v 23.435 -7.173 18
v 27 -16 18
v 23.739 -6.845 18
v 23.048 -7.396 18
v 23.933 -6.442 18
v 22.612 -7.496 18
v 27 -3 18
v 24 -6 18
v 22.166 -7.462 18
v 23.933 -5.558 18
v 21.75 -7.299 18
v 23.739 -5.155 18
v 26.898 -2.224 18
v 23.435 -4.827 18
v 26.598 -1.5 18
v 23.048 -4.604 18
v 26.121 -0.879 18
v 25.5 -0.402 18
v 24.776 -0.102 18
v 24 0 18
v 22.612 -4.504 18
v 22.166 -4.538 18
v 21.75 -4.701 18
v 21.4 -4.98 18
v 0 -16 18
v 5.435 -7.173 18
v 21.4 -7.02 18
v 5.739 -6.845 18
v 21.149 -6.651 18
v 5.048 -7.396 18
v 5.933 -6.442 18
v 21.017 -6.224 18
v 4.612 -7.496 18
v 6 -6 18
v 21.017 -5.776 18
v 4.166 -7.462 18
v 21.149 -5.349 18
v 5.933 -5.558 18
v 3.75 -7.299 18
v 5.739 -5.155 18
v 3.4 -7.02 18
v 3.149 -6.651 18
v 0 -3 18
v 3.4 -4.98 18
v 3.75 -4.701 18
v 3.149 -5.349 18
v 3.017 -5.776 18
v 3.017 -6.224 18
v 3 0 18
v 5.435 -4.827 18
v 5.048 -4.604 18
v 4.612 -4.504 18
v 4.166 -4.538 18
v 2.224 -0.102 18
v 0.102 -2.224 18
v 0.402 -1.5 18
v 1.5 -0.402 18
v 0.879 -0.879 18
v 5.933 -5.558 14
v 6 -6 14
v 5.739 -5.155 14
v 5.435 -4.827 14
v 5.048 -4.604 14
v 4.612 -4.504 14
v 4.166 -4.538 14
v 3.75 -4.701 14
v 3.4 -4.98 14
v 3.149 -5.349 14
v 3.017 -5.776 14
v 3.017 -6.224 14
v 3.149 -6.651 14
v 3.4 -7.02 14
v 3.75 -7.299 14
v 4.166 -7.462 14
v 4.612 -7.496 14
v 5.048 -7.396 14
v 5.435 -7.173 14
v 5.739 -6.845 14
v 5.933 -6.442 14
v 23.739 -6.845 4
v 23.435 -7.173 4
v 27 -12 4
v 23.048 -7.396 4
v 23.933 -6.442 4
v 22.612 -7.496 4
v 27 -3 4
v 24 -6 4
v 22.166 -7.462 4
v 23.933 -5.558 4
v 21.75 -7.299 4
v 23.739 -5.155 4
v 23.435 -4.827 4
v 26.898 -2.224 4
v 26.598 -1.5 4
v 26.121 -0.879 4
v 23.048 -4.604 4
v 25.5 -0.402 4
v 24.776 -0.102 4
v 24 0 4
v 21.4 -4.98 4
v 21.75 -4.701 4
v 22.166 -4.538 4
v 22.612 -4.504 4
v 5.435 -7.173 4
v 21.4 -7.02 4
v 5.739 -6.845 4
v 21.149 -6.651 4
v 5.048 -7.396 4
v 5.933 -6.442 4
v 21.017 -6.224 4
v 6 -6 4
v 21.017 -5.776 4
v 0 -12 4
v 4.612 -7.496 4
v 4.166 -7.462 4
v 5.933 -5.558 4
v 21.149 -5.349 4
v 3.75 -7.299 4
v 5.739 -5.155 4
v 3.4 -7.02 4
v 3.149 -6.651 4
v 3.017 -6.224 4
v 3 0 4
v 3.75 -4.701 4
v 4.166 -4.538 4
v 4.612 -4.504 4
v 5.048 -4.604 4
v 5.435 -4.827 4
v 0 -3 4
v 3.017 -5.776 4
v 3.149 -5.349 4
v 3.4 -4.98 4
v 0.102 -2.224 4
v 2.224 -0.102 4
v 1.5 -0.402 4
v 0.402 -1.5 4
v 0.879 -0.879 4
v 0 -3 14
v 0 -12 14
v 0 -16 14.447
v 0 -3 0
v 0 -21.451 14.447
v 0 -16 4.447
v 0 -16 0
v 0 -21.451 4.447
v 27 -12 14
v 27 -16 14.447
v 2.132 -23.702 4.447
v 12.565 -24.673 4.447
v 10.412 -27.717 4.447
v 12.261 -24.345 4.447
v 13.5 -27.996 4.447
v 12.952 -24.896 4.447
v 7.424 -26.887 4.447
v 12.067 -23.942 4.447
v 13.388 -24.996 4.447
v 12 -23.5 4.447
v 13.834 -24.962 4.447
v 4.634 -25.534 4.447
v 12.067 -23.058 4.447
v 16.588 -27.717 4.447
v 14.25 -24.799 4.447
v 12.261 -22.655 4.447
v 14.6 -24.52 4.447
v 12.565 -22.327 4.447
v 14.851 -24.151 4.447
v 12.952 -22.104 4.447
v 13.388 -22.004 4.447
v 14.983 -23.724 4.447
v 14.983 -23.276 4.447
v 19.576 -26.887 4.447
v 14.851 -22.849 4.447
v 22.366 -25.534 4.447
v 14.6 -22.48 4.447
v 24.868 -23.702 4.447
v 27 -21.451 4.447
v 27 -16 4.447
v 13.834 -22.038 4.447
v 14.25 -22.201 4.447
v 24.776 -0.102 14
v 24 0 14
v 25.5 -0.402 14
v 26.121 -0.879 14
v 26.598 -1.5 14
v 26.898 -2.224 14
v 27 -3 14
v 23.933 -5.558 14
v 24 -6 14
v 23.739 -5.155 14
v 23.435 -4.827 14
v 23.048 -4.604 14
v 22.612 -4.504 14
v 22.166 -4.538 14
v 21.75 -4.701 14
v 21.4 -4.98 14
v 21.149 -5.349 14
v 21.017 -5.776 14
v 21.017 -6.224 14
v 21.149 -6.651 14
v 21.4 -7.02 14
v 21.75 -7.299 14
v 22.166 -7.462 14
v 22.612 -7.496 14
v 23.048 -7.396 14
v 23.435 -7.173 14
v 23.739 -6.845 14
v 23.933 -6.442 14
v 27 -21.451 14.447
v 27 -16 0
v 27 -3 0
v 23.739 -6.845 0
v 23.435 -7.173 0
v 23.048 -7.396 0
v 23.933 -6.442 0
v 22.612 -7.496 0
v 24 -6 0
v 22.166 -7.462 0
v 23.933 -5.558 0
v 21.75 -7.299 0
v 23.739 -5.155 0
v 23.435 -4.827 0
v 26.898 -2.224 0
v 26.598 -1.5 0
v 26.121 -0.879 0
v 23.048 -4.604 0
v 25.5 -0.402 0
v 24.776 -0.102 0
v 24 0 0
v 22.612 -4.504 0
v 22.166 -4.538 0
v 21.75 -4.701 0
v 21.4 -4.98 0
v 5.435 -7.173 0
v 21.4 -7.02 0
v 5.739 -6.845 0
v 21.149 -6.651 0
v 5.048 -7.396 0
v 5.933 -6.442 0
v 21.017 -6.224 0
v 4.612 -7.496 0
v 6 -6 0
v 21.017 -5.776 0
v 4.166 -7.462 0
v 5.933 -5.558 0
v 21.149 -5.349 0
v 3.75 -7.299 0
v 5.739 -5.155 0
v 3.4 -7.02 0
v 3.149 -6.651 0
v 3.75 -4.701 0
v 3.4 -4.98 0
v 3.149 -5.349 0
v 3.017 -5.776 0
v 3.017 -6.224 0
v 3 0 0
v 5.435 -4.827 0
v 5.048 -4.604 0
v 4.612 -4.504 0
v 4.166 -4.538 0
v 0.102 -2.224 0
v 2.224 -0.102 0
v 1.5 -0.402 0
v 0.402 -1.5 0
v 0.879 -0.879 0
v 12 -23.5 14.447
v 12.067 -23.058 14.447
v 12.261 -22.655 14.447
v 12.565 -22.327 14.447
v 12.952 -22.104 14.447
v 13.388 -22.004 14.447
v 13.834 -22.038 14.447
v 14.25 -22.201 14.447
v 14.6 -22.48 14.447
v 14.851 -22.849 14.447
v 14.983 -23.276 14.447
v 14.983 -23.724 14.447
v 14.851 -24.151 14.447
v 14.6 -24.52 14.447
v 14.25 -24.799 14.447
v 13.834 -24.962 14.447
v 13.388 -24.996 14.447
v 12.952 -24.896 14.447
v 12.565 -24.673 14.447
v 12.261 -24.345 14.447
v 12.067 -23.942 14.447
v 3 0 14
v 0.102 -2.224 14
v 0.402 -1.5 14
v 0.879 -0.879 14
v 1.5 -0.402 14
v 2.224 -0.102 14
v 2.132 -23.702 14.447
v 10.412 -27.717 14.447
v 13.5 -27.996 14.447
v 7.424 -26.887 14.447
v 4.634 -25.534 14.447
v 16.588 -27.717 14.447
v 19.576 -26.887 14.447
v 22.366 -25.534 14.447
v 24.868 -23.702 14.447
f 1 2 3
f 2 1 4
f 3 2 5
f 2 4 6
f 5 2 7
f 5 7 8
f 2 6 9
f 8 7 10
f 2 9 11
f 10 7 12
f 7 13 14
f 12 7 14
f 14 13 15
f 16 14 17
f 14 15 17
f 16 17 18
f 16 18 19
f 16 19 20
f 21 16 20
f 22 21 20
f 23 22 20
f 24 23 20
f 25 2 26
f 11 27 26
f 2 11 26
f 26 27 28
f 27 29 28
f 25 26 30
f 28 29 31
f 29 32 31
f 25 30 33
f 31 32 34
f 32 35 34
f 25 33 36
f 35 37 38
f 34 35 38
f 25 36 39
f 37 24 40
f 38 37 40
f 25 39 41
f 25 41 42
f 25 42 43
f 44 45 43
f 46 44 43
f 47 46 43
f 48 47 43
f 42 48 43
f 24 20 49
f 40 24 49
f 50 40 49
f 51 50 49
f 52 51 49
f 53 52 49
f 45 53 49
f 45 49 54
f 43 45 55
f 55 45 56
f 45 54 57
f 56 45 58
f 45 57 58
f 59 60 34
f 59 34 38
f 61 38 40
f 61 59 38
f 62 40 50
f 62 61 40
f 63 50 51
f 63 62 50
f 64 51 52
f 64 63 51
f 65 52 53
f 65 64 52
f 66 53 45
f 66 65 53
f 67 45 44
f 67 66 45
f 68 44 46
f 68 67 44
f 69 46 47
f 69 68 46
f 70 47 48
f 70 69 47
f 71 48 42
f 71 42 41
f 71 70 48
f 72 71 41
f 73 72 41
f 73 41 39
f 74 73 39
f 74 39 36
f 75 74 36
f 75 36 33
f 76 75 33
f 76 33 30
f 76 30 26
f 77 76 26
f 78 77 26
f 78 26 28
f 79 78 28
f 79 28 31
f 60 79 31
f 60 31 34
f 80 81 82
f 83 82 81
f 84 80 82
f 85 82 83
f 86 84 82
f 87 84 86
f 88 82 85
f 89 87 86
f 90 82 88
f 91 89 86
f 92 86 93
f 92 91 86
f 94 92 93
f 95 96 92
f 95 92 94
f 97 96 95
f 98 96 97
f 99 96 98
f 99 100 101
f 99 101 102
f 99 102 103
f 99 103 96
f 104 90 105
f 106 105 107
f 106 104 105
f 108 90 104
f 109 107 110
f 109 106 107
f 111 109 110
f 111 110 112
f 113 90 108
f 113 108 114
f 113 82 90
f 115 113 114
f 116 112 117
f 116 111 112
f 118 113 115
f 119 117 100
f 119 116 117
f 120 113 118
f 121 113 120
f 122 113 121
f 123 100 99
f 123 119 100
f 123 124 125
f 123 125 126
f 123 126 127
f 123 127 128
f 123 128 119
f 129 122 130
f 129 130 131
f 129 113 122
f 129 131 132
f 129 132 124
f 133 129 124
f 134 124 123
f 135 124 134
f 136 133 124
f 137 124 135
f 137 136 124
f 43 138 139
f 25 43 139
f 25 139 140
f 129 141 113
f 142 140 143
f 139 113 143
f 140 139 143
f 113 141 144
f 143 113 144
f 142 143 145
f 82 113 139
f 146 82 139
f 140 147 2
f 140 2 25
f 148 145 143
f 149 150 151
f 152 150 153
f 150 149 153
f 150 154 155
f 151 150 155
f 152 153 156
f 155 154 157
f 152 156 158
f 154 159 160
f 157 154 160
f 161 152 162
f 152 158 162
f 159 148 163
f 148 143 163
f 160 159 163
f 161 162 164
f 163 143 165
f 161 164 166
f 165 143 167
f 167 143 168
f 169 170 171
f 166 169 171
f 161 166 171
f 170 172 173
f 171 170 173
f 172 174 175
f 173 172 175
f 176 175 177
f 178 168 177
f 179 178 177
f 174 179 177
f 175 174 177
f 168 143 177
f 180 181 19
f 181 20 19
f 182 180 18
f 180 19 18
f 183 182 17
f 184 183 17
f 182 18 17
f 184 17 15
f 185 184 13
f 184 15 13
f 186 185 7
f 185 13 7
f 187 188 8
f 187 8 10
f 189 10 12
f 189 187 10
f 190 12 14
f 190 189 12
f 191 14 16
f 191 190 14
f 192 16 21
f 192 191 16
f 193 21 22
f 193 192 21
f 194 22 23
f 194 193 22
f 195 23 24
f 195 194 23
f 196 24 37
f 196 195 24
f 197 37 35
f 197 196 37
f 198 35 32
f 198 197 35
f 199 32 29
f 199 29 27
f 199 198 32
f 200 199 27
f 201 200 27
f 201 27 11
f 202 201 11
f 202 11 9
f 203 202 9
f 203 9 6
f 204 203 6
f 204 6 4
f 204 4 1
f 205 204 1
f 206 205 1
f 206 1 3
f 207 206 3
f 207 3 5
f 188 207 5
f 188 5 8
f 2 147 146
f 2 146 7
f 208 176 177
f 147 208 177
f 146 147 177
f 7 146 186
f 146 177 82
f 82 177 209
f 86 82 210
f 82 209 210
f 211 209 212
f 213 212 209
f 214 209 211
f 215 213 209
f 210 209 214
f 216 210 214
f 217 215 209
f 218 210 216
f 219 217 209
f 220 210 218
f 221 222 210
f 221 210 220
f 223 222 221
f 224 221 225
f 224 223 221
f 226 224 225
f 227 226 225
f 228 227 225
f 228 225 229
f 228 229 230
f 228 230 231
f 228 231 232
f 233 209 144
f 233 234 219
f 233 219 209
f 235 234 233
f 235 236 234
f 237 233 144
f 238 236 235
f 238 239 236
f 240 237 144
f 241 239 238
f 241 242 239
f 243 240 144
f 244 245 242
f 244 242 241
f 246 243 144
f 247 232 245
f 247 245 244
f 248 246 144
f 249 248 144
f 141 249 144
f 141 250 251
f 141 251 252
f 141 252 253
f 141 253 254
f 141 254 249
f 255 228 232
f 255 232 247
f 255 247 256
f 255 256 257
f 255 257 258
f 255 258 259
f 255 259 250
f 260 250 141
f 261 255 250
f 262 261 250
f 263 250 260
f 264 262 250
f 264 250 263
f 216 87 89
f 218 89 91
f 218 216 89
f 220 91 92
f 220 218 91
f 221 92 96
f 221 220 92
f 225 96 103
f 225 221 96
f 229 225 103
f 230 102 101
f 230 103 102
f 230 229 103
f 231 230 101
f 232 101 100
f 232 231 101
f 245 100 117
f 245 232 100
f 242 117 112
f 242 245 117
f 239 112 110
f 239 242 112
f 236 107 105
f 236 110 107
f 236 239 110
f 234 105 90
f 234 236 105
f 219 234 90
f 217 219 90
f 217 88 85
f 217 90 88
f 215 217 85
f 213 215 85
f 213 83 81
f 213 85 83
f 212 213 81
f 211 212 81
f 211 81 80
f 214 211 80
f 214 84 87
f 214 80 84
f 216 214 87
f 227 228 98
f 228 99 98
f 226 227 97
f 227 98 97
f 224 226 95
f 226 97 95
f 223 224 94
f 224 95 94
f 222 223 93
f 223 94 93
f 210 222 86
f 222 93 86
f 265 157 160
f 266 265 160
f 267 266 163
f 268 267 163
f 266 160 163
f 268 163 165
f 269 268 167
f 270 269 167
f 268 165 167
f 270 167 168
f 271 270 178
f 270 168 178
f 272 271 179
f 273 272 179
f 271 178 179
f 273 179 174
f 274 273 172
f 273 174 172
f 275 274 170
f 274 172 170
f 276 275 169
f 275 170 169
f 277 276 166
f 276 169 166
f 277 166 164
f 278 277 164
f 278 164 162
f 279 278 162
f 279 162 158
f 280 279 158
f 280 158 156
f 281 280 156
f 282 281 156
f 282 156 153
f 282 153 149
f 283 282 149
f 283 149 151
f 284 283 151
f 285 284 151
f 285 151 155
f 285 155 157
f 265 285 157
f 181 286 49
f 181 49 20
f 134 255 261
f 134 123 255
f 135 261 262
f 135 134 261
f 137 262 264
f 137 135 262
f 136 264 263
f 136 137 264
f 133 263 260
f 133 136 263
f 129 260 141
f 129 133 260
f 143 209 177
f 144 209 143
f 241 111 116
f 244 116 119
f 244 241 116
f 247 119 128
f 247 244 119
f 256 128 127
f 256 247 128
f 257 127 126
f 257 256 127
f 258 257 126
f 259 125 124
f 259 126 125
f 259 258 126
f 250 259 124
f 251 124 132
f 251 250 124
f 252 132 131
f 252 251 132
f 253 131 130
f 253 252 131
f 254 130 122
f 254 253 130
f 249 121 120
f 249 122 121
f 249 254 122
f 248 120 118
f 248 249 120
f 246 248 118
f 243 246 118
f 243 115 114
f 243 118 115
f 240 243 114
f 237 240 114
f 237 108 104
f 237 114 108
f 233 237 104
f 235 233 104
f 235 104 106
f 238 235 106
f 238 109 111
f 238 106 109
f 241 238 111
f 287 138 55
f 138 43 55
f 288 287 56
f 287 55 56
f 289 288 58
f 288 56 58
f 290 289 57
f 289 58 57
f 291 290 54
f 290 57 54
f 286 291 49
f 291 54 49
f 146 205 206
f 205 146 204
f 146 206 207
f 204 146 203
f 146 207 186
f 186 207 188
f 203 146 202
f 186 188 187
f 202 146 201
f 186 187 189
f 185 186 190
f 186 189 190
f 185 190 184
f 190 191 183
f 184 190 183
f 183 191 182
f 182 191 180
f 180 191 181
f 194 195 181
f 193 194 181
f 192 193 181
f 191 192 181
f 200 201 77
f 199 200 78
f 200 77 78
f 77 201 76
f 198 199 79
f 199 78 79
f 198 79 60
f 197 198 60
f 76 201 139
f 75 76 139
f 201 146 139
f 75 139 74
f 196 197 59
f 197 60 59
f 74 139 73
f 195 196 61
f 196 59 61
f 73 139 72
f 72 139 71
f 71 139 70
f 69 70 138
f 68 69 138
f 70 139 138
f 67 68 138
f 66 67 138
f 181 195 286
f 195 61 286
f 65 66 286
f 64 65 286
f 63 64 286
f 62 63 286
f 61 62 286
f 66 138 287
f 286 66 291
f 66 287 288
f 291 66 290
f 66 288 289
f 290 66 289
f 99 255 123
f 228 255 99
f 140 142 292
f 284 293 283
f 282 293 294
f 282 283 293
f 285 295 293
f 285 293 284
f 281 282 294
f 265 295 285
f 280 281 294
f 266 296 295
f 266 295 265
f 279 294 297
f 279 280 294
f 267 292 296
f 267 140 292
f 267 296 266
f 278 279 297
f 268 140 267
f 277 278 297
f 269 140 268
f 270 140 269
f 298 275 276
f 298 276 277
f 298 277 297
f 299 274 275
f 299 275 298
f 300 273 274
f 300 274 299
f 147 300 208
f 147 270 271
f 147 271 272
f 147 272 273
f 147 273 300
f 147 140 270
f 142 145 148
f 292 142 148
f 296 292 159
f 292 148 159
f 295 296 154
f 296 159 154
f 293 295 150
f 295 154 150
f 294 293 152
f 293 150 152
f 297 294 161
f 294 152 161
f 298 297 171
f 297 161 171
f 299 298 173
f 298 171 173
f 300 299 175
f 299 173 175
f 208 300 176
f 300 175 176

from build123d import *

# Parameters (mm, degrees)
SKETCH2_R           = 1.5
BOSS_EXTRUDE1_DEPTH = 18
SKETCH3_W           = 10
SKETCH3_H           = 12
CUT_EXTRUDE1_DEPTH  = 32
SKETCH4_W           = 27
SKETCH4_H           = 5
BOSS_EXTRUDE3_DEPTH = 12
SKETCH8_R           = 1.5
CUT_EXTRUDE3_DEPTH  = 12
FILLET1_R           = 3
FILLET2_R           = 3
FILLET3_R           = 3
FILLET4_R           = 3


with BuildPart() as part:
    # Sketch2 → Boss-Extrude1 (new body)
    with BuildSketch(Plane.XY):
        Polygon((0, 0), (27, 0), (27, -12), (27, -16), (0, -16), (0, -12), align=None)
        with Locations((4.5, -6)):
            Circle(SKETCH2_R, mode=Mode.SUBTRACT)
        with Locations((22.5, -6)):
            Circle(SKETCH2_R, mode=Mode.SUBTRACT)
    extrude(amount=BOSS_EXTRUDE1_DEPTH)

    # Sketch3 → Cut-Extrude1 (cut)
    with BuildSketch(Plane.ZY):
        with Locations((9, -6)):
            Rectangle(SKETCH3_W, SKETCH3_H)
    extrude(amount=-CUT_EXTRUDE1_DEPTH, mode=Mode.SUBTRACT)

    # Sketch4 → Boss-Extrude3 (add)
    with BuildSketch(Plane.XZ.offset(16)):
        with Locations((13.5, 11.947290181)):
            Rectangle(SKETCH4_W, SKETCH4_H)
        with Locations((13.5, 6.947290181)):
            Rectangle(SKETCH4_W, SKETCH4_H)
    extrude(amount=BOSS_EXTRUDE3_DEPTH)

    # Sketch8 → Cut-Extrude3 (cut)
    with BuildSketch(Plane(origin=(0, 0, 4.447290181), x_dir=(-1, 0, 0), z_dir=(0, 0, -1))):
        with Locations((-13.5, -23.5)):
            Circle(SKETCH8_R)
        with BuildLine():
            Line((-27, -21.451026779), (-27, -28))
            Line((-27, -28), (0, -28))
            Line((0, -28), (0, -21.451026779))
            ThreePointArc((0, -21.451026779), (-13.5, -27.996407915), (-27, -21.451026779))
        make_face()
    extrude(amount=-CUT_EXTRUDE3_DEPTH, mode=Mode.SUBTRACT)

    # Fillet1
    fillet1_edges = [part.edges().sort_by_distance(p)[0] for p in [
        (0, 0, 2),
    ]]
    fillet(fillet1_edges, radius=FILLET1_R)

    # Fillet2
    fillet2_edges = [part.edges().sort_by_distance(p)[0] for p in [
        (27, 0, 2),
    ]]
    fillet(fillet2_edges, radius=FILLET2_R)

    # Fillet3
    fillet3_edges = [part.edges().sort_by_distance(p)[0] for p in [
        (0, 0, 16),
    ]]
    fillet(fillet3_edges, radius=FILLET3_R)

    # Fillet4
    fillet4_edges = [part.edges().sort_by_distance(p)[0] for p in [
        (27, 0, 16),
    ]]
    fillet(fillet4_edges, radius=FILLET4_R)


solid = part.part
